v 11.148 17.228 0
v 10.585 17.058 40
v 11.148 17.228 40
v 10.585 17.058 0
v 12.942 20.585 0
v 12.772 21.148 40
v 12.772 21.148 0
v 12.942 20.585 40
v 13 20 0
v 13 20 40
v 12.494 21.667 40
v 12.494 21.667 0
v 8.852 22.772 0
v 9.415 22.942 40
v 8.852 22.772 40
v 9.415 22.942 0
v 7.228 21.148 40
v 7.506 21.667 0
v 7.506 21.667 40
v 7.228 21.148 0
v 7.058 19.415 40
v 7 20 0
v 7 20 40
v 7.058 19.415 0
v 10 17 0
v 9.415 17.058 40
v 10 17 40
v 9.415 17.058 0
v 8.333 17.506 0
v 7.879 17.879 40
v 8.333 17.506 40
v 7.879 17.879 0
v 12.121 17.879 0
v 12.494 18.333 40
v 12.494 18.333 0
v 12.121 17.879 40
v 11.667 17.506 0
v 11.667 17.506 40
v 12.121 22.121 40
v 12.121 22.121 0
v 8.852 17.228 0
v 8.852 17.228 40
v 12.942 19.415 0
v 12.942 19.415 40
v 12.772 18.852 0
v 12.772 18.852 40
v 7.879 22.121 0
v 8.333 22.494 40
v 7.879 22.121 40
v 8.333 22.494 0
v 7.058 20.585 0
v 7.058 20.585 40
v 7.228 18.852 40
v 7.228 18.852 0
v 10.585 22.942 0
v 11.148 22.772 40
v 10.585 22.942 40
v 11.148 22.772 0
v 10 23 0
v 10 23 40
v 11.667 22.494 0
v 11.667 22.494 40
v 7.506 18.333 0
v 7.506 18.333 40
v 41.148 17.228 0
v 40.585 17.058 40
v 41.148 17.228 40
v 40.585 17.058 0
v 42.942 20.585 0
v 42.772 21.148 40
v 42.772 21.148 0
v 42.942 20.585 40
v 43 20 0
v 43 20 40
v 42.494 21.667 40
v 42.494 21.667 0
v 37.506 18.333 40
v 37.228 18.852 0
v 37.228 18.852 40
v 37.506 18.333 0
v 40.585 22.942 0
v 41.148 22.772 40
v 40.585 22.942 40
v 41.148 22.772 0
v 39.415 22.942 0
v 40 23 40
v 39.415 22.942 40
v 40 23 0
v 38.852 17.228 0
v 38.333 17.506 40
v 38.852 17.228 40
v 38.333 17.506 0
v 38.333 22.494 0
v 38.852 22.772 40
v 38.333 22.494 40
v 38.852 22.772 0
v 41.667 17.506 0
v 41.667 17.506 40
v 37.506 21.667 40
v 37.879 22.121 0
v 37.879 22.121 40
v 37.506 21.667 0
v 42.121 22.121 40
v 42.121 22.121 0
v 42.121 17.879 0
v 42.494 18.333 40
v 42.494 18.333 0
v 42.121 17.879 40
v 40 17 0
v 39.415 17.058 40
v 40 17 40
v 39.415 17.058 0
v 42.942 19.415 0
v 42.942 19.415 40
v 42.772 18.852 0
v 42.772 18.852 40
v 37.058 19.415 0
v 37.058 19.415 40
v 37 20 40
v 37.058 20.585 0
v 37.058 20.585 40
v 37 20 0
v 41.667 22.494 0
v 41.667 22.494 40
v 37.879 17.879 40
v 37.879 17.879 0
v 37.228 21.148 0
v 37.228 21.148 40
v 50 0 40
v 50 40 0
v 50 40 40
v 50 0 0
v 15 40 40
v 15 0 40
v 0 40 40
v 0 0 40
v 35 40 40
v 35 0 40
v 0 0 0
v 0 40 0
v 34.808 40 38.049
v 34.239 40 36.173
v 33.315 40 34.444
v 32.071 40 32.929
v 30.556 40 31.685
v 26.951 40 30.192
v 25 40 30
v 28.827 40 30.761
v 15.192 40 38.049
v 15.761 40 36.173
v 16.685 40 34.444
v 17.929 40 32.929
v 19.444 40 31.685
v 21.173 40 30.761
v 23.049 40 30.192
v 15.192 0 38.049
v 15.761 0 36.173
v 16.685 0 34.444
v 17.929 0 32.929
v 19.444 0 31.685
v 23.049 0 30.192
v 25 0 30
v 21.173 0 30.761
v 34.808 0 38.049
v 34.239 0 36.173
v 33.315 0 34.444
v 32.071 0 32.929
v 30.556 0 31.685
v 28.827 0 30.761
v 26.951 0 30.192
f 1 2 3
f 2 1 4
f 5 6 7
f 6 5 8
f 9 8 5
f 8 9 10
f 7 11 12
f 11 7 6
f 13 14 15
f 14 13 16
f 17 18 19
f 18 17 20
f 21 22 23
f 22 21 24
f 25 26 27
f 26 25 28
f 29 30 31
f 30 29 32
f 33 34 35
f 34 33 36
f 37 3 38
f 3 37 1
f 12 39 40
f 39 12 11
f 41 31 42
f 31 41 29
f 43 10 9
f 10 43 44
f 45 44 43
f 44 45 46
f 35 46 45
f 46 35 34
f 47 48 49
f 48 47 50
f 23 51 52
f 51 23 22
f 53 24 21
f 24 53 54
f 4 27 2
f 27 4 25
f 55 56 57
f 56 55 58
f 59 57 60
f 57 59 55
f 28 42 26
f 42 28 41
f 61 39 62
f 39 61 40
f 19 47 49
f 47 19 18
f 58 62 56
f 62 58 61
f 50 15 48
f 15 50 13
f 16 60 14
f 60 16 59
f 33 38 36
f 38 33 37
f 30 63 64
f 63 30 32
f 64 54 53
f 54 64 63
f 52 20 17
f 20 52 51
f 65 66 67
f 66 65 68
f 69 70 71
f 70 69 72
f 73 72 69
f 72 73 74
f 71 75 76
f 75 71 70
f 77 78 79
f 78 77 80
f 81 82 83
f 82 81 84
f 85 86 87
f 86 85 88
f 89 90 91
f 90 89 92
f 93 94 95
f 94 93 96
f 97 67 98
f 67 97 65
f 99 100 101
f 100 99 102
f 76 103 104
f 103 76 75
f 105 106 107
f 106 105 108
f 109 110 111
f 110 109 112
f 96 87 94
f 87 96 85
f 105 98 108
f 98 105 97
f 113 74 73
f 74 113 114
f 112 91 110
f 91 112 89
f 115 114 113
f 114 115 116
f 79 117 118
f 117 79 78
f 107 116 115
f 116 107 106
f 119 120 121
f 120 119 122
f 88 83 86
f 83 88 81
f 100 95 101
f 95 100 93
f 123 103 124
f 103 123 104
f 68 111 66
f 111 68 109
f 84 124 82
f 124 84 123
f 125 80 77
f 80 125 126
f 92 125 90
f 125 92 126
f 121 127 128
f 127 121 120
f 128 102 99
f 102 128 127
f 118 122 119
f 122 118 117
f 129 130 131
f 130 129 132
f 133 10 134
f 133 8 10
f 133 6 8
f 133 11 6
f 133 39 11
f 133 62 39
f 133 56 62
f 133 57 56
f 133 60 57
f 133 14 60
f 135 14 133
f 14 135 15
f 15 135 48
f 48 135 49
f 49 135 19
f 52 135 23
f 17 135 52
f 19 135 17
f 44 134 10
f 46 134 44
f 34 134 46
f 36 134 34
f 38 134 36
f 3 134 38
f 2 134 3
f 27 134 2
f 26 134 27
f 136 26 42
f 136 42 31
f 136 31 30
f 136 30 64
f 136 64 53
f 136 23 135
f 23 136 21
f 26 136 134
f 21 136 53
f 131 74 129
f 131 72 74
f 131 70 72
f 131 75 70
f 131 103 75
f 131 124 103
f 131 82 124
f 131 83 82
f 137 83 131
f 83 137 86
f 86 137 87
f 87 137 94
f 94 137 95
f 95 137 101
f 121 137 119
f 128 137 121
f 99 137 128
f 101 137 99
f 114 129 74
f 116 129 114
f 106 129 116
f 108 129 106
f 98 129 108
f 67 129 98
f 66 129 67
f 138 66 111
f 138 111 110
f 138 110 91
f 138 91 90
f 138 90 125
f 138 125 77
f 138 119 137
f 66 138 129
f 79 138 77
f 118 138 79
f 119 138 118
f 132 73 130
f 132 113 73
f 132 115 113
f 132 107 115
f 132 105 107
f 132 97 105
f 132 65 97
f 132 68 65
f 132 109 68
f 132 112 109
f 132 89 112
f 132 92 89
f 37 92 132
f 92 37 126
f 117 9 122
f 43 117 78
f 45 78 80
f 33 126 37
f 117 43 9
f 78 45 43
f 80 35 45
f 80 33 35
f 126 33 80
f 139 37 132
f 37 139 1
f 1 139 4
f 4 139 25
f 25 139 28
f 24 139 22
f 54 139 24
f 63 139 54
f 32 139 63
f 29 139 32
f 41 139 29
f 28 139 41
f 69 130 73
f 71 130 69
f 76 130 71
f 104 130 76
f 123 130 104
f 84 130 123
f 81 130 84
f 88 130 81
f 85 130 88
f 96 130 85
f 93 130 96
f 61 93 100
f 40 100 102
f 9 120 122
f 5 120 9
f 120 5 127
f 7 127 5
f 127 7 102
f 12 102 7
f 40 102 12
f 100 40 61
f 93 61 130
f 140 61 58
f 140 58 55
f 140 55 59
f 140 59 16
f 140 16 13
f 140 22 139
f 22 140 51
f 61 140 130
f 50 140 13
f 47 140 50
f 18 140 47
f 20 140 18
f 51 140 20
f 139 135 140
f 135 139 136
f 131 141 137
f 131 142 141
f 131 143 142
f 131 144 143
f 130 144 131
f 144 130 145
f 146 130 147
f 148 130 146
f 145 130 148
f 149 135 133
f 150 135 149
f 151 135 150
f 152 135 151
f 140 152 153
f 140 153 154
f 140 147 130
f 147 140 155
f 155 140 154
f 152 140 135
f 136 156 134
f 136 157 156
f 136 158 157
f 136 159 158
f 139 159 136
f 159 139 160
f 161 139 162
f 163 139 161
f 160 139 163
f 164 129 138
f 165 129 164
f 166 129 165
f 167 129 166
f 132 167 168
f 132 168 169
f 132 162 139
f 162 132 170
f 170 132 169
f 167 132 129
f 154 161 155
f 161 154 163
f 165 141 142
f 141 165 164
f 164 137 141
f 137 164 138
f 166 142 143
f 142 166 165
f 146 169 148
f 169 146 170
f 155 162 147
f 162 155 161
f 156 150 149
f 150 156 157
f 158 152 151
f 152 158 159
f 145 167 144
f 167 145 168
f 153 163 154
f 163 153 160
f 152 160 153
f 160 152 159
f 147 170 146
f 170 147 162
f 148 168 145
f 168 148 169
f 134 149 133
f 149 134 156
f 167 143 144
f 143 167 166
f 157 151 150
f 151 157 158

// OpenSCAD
$fn = 32;

// ----------------------------------------------------------------------
// Saddle clamp: plain shaft clamp
// ----------------------------------------------------------------------

// --- parameters (mm) ---
blk_l = 50;               // block length, X
blk_w = 40;               // block width, Y
blk_h = 40;               // block height
clamp_r = 10;             // shaft groove radius
hole_r = 3;               // bolt hole radius
hole_m = 10;              // bolt hole margin from the ends

saw_depth = clamp_r + 3;  // saw kerf depth

difference() {
  cube([blk_l, blk_w, blk_h]);
  translate([blk_l / 2, -1, blk_h])
    rotate([-90, 0, 0])
      cylinder(h = blk_w + 2, r = clamp_r);
  for (sx = [0, 1])
    translate([sx ? blk_l - hole_m : hole_m, blk_w / 2, -1])
      cylinder(r = hole_r, h = blk_h + 2);
}
